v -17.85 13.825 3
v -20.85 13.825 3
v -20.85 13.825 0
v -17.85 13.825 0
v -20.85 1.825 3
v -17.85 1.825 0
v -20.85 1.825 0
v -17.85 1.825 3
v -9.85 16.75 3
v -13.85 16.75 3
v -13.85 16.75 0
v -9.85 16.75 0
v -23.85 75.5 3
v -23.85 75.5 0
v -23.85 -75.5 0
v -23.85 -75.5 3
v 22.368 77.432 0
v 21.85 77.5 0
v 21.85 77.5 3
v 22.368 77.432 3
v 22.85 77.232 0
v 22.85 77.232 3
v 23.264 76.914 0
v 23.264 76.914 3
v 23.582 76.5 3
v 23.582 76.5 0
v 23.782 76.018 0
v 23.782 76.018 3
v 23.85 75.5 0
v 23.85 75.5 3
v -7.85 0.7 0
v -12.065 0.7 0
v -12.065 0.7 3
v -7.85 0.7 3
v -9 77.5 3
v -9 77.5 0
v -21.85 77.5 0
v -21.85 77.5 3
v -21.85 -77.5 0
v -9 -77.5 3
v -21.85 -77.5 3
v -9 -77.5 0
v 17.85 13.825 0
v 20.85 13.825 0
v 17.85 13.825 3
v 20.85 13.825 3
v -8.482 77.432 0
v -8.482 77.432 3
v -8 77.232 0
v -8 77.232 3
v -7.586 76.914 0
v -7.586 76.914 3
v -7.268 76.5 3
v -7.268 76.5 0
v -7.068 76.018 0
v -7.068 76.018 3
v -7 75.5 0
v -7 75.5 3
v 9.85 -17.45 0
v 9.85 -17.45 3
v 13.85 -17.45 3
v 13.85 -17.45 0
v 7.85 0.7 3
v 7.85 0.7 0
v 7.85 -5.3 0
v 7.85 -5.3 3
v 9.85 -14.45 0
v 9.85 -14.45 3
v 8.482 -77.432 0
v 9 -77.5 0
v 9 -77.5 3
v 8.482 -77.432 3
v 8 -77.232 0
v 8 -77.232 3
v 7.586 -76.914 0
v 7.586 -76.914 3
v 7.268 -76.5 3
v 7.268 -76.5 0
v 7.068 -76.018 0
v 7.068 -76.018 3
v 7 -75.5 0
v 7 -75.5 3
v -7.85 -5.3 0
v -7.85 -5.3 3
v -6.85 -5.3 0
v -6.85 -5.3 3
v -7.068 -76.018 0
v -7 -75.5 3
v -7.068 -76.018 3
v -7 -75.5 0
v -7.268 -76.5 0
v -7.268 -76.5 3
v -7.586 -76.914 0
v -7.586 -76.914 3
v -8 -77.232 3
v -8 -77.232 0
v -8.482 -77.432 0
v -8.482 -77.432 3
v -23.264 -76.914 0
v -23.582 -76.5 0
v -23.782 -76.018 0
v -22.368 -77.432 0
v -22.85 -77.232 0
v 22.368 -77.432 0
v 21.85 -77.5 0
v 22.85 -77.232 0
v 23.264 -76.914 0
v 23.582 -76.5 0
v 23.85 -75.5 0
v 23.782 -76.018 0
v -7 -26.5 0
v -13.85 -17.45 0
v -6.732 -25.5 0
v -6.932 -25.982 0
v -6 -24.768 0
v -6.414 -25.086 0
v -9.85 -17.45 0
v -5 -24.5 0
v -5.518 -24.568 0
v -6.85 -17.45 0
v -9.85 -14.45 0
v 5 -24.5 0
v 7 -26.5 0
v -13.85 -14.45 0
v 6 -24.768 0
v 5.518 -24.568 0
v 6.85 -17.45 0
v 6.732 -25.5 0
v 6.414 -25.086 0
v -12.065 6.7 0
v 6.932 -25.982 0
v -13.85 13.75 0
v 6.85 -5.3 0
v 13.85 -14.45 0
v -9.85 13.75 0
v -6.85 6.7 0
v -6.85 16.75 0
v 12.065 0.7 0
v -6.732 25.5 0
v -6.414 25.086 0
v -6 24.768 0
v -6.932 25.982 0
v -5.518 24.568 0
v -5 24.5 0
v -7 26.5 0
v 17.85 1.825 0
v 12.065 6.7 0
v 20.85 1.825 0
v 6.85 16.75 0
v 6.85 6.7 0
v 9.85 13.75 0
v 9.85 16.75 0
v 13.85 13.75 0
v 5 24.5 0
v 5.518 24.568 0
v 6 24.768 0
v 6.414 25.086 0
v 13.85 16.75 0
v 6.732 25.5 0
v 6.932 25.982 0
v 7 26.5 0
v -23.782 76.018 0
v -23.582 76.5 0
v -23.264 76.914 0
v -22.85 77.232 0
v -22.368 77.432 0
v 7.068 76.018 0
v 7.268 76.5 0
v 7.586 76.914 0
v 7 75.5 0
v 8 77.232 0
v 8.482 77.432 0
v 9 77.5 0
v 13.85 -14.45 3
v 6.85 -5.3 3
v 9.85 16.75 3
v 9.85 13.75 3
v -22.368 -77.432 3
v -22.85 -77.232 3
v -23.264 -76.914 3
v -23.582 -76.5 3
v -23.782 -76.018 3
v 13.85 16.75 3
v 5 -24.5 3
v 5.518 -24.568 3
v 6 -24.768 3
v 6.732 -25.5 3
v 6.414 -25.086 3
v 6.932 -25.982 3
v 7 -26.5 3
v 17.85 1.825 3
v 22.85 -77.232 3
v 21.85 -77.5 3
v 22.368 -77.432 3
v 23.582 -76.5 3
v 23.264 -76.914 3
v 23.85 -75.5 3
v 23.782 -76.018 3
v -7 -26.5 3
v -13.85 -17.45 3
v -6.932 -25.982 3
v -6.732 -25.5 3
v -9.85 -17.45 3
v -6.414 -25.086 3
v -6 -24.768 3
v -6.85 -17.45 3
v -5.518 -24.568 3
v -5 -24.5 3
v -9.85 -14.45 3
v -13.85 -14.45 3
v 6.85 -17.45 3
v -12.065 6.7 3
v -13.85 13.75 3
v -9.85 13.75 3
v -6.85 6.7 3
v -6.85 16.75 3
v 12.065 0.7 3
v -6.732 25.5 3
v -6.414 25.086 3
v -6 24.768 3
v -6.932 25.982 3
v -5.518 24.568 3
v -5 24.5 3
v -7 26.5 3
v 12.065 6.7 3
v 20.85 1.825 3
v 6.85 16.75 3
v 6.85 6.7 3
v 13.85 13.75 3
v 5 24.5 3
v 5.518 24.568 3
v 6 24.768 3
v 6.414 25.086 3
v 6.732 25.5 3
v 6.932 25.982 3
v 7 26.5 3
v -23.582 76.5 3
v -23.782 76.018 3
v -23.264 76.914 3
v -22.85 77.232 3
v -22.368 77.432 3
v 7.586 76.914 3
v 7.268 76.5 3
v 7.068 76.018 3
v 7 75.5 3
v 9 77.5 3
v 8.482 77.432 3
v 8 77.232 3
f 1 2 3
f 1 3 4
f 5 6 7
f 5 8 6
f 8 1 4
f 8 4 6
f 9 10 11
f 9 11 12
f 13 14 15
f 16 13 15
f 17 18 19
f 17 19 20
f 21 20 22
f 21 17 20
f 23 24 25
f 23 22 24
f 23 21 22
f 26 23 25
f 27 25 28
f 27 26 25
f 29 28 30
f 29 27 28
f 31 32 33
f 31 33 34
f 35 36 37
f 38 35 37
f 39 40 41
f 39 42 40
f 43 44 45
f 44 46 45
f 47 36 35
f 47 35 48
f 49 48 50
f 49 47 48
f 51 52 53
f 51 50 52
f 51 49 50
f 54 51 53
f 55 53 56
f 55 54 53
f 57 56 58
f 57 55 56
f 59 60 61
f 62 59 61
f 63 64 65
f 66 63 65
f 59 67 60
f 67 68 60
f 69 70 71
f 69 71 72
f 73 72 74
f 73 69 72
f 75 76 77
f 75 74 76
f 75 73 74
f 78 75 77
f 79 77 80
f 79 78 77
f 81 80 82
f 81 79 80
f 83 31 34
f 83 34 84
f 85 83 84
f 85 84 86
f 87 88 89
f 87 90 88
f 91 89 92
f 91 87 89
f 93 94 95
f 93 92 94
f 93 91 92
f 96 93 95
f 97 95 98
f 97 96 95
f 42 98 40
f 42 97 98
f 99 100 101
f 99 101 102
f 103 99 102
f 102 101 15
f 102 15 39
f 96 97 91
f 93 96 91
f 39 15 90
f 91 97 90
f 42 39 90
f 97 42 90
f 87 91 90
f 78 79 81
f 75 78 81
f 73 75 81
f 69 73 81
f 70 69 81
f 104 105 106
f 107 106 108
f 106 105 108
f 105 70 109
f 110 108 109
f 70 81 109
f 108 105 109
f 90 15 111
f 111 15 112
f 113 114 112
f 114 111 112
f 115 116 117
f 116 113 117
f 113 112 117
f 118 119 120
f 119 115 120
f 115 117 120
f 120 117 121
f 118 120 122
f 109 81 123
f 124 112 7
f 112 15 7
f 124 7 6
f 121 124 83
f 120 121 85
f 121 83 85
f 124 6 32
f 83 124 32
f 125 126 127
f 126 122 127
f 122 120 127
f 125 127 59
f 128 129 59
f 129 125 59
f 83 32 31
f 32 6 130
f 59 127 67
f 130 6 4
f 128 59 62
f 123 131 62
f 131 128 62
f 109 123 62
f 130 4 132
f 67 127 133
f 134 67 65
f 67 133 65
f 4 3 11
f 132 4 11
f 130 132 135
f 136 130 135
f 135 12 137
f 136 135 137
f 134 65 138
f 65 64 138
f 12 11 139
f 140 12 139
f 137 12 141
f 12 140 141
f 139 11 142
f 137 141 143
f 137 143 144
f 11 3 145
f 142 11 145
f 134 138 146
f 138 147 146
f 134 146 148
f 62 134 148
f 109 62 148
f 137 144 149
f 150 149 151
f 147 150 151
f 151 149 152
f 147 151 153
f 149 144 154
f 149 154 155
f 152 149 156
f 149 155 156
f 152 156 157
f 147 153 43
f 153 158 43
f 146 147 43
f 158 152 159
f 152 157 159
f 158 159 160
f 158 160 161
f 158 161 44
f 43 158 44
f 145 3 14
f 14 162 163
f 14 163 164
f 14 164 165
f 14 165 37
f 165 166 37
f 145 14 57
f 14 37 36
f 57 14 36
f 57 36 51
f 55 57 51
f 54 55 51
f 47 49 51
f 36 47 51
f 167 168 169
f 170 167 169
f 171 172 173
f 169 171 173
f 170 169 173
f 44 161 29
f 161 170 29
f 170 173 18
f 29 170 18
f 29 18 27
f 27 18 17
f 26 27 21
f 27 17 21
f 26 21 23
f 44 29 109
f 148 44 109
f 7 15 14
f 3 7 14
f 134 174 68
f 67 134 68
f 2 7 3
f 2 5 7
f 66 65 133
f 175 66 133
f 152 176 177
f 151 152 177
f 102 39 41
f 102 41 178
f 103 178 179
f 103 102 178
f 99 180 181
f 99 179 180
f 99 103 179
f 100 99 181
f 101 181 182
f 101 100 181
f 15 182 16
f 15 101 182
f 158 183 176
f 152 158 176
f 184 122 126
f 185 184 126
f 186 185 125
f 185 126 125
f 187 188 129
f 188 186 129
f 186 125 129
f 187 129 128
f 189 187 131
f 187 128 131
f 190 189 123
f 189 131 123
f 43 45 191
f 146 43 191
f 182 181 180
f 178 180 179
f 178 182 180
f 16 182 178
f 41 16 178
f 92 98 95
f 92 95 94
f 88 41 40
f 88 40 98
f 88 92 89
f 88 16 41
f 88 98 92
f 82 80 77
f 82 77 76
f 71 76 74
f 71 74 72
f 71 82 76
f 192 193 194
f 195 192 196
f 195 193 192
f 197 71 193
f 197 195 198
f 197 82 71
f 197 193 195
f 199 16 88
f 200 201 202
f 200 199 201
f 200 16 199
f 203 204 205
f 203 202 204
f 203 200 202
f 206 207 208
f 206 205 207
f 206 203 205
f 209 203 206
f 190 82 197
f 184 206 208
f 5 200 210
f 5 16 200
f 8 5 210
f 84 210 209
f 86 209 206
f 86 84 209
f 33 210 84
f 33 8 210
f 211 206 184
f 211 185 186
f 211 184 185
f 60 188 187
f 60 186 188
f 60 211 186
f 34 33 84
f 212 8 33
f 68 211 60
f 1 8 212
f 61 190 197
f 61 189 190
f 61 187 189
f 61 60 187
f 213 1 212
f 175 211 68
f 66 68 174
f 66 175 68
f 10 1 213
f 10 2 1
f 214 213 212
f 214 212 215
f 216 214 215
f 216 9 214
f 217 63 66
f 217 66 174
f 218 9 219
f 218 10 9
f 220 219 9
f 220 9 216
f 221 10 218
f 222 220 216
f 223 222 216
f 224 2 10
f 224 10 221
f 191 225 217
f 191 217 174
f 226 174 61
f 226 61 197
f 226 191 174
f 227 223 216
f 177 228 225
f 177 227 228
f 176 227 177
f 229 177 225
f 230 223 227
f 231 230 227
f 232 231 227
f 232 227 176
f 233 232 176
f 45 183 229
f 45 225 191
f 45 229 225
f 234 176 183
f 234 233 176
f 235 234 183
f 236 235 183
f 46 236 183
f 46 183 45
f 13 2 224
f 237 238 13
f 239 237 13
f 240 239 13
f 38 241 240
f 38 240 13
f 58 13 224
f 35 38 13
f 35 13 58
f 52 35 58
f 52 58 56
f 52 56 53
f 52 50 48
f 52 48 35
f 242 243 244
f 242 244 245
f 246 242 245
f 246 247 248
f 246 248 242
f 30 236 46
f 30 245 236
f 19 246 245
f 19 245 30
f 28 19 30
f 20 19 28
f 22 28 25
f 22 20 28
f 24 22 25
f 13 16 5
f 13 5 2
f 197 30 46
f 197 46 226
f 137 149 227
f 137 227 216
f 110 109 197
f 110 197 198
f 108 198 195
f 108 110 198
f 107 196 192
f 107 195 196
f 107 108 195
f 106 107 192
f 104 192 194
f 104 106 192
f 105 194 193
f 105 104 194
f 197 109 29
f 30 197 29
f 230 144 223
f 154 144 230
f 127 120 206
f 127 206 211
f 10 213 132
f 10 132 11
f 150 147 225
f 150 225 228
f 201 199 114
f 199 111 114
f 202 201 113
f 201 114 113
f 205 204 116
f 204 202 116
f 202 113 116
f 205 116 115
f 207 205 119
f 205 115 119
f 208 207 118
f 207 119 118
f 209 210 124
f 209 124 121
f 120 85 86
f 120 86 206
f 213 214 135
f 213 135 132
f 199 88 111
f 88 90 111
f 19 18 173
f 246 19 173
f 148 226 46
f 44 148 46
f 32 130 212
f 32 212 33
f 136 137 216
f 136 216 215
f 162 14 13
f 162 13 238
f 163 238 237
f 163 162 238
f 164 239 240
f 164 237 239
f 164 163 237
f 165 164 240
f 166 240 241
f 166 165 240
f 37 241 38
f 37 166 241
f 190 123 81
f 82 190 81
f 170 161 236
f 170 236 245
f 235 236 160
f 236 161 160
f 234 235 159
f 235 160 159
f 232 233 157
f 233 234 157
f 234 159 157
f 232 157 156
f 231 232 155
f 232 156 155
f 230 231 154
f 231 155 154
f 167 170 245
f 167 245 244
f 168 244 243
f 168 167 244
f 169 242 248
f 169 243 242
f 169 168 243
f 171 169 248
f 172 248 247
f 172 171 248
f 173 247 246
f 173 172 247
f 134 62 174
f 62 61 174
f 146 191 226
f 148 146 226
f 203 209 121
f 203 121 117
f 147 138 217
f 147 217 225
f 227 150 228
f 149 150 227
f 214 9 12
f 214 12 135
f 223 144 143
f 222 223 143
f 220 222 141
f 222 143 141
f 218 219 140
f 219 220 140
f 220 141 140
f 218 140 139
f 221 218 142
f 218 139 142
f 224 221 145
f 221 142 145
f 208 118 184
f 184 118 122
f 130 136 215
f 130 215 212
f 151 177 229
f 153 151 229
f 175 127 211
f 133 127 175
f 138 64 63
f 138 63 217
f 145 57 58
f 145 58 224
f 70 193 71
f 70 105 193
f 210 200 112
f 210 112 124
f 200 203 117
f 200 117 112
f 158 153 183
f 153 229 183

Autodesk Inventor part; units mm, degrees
ref_plane "YZ Plane" through (0, 0, 0) normal (1, 0, 0) x (0, 1, 0)
ref_plane "XZ Plane" through (0, 0, 0) normal (0, 1, 0) x (-1, 0, 0)
ref_plane "XY Plane" through (0, 0, 0) normal (0, 0, 1) x (1, 0, 0)
sketch "草圖1" plane through (0, 0, 0) normal (0, 0, 1) x (1, 0, 0)
  line L0 (-23.85, -77.5) -> (23.85, 77.5) construction
  line L1 (23.85, -77.5) -> (-23.85, 77.5) construction
  line L2 (0, 127.6921) -> (0, -161.3915) construction
  line L3 (-23.85, 75.5) -> (-23.85, -75.5)
  line L4 (23.85, -75.5) -> (23.85, 75.5)
  line L5 (-5, 24.5) -> (5, 24.5)
  line L6 (7, 26.5) -> (7, 75.5)
  line L7 (-7, 75.5) -> (-7, 26.5)
  line L8 (-7, 24.5) -> (7, 77.5) construction
  line L9 (7, 24.5) -> (-7, 77.5) construction
  line L10 (21.85, 77.5) -> (9, 77.5)
  line L11 (-9, 77.5) -> (-21.85, 77.5)
  arc A0 (-7, 75.5) -> (-9, 77.5) centre (-9, 75.5) ccw
  arc A1 (9, 77.5) -> (7, 75.5) centre (9, 75.5) ccw
  arc A2 (-7, 26.5) -> (-5, 24.5) centre (-5, 26.5) ccw
  arc A3 (5, 24.5) -> (7, 26.5) centre (5, 26.5) ccw
  arc A4 (-21.85, 77.5) -> (-23.85, 75.5) centre (-21.85, 75.5) ccw
  arc A5 (23.85, 75.5) -> (21.85, 77.5) centre (21.85, 75.5) ccw
  line L12 (-82.8249, 0) -> (86.4934, 0) construction
  line L13 (-5, -24.5) -> (5, -24.5)
  line L14 (7, -26.5) -> (7, -75.5)
  line L15 (-7, -75.5) -> (-7, -26.5)
  line L16 (-7, -24.5) -> (7, -77.5) construction
  line L17 (7, -24.5) -> (-7, -77.5) construction
  line L18 (21.85, -77.5) -> (9, -77.5)
  line L19 (-9, -77.5) -> (-21.85, -77.5)
  arc A6 (-9, -77.5) -> (-7, -75.5) centre (-9, -75.5) ccw
  arc A7 (7, -75.5) -> (9, -77.5) centre (9, -75.5) ccw
  arc A8 (-5, -24.5) -> (-7, -26.5) centre (-5, -26.5) ccw
  arc A9 (7, -26.5) -> (5, -24.5) centre (5, -26.5) ccw
  arc A10 (-23.85, -75.5) -> (-21.85, -77.5) centre (-21.85, -75.5) ccw
  arc A11 (21.85, -77.5) -> (23.85, -75.5) centre (21.85, -75.5) ccw
  line L20 (-21.85, -77.5) -> (-9, -77.5)
  line L21 (9, -77.5) -> (21.85, -77.5)
  line L22 (-6.85, -17.45) -> (6.85, -17.45)
  line L23 (6.85, 16.75) -> (-6.85, 16.75)
  line L24 (12.065, 0.7) -> (12.065, 6.7)
  line L25 (-12.065, 6.7) -> (-12.065, 0.7)
  line L26 (-12.065, 0.7) -> (12.065, 6.7) construction
  line L27 (12.065, 0.7) -> (-12.065, 6.7) construction
  line L28 (-6.85, 16.75) -> (-6.85, 6.7)
  line L29 (6.85, 6.7) -> (6.85, 16.75)
  line L30 (12.065, 6.7) -> (6.85, 6.7)
  line L31 (7.85, 0.7) -> (12.065, 0.7)
  line L32 (-12.065, 0.7) -> (-7.85, 0.7)
  line L33 (-6.85, 6.7) -> (-12.065, 6.7)
  line L34 (-7.85, 0.7) -> (-7.85, -5.3)
  line L35 (-7.85, -5.3) -> (-6.85, -5.3)
  line L36 (-6.85, -5.3) -> (-6.85, -17.45)
  line L37 (7.85, 0.7) -> (7.85, -5.3)
  line L38 (7.85, -5.3) -> (6.85, -5.3)
  line L39 (6.85, -17.45) -> (6.85, -5.3)
  point P0 (0, 0)
  point P1 (0, 51)
  point P2 (0, -51)
  point P3 (0, 3.7)
  point P4 (12.065, 3.7)
  point P5 (-23.85, -75.5)
  dimension "d0" = 47.7
  dimension "d22" = 14
  dimension "d24" = 2
  dimension "d25" = 2
  dimension "d26" = 34.2
  dimension "d27" = 13.7
  dimension "d28" = 6
  dimension "d30" = 24.13
  dimension "d31" = 10.05
  dimension "d54" = 53
  dimension "d97" = 6
  dimension "d98" = 1
  dimension "d101" = 0.7
  dimension "d103" = 155
extrude "擠出1" add sketch "草圖1" along normal blind 3
sketch "草圖3" plane through (0, 0, 3) normal (0, 0, 1) x (1, 0, 0)
  line L0 (-88.1264, 0) -> (75.7938, 0)
  line L1 (0, 123.8394) -> (0, -129.4918)
  point P0 (0, 0)
sketch "草圖5" plane through (0, 0, 3) normal (0, 0, 1) x (1, 0, 0)
  line L0 (-9.85, -17.45) -> (-13.85, -17.45)
  line L1 (-13.85, -17.45) -> (-13.85, -14.45)
  line L2 (-13.85, -14.45) -> (-9.85, -14.45)
  line L3 (-9.85, -14.45) -> (-9.85, -17.45)
  line L4 (6.85, -17.45) -> (-6.85, -17.45) projected
  line L5 (-9.85, 13.75) -> (-13.85, 13.75)
  line L6 (-13.85, 13.75) -> (-13.85, 16.75)
  line L7 (-13.85, 16.75) -> (-9.85, 16.75)
  line L8 (-9.85, 16.75) -> (-9.85, 13.75)
  line L9 (-6.85, 16.75) -> (6.85, 16.75) projected
  line L10 (0, 31.1544) -> (0, -25.4134)
  line L11 (9.85, -17.45) -> (13.85, -17.45)
  line L12 (13.85, -17.45) -> (13.85, -14.45)
  line L13 (13.85, -14.45) -> (9.85, -14.45)
  line L14 (9.85, -14.45) -> (9.85, -17.45)
  line L15 (13.85, 16.75) -> (9.85, 16.75)
  line L16 (13.85, 13.75) -> (13.85, 16.75)
  line L17 (9.85, 13.75) -> (13.85, 13.75)
  line L18 (9.85, 16.75) -> (9.85, 13.75)
  line L19 (-17.85, 1.825) -> (-20.85, 1.825)
  line L20 (-20.85, 1.825) -> (-20.85, 13.825)
  line L21 (-20.85, 13.825) -> (-17.85, 13.825)
  line L22 (-17.85, 13.825) -> (-17.85, 1.825)
  line L23 (17.85, 1.825) -> (20.85, 1.825)
  line L24 (20.85, 1.825) -> (20.85, 13.825)
  line L25 (20.85, 13.825) -> (17.85, 13.825)
  line L26 (17.85, 13.825) -> (17.85, 1.825)
  line L27 (-6.85, -17.45) -> (-6.85, 16.75) construction
  point P0 (0, 0)
  dimension "d60" = 4
  dimension "d62" = 3
  dimension "d64" = 3
  dimension "d66" = 3
  dimension "d67" = 12
  dimension "d96" = 3
  dimension "d100" = 11
  dimension "d102" = 0.075
extrude "擠出4" cut sketch "草圖5" against normal up to next
properties part number "main_frame" material "木材 (楓木)"
